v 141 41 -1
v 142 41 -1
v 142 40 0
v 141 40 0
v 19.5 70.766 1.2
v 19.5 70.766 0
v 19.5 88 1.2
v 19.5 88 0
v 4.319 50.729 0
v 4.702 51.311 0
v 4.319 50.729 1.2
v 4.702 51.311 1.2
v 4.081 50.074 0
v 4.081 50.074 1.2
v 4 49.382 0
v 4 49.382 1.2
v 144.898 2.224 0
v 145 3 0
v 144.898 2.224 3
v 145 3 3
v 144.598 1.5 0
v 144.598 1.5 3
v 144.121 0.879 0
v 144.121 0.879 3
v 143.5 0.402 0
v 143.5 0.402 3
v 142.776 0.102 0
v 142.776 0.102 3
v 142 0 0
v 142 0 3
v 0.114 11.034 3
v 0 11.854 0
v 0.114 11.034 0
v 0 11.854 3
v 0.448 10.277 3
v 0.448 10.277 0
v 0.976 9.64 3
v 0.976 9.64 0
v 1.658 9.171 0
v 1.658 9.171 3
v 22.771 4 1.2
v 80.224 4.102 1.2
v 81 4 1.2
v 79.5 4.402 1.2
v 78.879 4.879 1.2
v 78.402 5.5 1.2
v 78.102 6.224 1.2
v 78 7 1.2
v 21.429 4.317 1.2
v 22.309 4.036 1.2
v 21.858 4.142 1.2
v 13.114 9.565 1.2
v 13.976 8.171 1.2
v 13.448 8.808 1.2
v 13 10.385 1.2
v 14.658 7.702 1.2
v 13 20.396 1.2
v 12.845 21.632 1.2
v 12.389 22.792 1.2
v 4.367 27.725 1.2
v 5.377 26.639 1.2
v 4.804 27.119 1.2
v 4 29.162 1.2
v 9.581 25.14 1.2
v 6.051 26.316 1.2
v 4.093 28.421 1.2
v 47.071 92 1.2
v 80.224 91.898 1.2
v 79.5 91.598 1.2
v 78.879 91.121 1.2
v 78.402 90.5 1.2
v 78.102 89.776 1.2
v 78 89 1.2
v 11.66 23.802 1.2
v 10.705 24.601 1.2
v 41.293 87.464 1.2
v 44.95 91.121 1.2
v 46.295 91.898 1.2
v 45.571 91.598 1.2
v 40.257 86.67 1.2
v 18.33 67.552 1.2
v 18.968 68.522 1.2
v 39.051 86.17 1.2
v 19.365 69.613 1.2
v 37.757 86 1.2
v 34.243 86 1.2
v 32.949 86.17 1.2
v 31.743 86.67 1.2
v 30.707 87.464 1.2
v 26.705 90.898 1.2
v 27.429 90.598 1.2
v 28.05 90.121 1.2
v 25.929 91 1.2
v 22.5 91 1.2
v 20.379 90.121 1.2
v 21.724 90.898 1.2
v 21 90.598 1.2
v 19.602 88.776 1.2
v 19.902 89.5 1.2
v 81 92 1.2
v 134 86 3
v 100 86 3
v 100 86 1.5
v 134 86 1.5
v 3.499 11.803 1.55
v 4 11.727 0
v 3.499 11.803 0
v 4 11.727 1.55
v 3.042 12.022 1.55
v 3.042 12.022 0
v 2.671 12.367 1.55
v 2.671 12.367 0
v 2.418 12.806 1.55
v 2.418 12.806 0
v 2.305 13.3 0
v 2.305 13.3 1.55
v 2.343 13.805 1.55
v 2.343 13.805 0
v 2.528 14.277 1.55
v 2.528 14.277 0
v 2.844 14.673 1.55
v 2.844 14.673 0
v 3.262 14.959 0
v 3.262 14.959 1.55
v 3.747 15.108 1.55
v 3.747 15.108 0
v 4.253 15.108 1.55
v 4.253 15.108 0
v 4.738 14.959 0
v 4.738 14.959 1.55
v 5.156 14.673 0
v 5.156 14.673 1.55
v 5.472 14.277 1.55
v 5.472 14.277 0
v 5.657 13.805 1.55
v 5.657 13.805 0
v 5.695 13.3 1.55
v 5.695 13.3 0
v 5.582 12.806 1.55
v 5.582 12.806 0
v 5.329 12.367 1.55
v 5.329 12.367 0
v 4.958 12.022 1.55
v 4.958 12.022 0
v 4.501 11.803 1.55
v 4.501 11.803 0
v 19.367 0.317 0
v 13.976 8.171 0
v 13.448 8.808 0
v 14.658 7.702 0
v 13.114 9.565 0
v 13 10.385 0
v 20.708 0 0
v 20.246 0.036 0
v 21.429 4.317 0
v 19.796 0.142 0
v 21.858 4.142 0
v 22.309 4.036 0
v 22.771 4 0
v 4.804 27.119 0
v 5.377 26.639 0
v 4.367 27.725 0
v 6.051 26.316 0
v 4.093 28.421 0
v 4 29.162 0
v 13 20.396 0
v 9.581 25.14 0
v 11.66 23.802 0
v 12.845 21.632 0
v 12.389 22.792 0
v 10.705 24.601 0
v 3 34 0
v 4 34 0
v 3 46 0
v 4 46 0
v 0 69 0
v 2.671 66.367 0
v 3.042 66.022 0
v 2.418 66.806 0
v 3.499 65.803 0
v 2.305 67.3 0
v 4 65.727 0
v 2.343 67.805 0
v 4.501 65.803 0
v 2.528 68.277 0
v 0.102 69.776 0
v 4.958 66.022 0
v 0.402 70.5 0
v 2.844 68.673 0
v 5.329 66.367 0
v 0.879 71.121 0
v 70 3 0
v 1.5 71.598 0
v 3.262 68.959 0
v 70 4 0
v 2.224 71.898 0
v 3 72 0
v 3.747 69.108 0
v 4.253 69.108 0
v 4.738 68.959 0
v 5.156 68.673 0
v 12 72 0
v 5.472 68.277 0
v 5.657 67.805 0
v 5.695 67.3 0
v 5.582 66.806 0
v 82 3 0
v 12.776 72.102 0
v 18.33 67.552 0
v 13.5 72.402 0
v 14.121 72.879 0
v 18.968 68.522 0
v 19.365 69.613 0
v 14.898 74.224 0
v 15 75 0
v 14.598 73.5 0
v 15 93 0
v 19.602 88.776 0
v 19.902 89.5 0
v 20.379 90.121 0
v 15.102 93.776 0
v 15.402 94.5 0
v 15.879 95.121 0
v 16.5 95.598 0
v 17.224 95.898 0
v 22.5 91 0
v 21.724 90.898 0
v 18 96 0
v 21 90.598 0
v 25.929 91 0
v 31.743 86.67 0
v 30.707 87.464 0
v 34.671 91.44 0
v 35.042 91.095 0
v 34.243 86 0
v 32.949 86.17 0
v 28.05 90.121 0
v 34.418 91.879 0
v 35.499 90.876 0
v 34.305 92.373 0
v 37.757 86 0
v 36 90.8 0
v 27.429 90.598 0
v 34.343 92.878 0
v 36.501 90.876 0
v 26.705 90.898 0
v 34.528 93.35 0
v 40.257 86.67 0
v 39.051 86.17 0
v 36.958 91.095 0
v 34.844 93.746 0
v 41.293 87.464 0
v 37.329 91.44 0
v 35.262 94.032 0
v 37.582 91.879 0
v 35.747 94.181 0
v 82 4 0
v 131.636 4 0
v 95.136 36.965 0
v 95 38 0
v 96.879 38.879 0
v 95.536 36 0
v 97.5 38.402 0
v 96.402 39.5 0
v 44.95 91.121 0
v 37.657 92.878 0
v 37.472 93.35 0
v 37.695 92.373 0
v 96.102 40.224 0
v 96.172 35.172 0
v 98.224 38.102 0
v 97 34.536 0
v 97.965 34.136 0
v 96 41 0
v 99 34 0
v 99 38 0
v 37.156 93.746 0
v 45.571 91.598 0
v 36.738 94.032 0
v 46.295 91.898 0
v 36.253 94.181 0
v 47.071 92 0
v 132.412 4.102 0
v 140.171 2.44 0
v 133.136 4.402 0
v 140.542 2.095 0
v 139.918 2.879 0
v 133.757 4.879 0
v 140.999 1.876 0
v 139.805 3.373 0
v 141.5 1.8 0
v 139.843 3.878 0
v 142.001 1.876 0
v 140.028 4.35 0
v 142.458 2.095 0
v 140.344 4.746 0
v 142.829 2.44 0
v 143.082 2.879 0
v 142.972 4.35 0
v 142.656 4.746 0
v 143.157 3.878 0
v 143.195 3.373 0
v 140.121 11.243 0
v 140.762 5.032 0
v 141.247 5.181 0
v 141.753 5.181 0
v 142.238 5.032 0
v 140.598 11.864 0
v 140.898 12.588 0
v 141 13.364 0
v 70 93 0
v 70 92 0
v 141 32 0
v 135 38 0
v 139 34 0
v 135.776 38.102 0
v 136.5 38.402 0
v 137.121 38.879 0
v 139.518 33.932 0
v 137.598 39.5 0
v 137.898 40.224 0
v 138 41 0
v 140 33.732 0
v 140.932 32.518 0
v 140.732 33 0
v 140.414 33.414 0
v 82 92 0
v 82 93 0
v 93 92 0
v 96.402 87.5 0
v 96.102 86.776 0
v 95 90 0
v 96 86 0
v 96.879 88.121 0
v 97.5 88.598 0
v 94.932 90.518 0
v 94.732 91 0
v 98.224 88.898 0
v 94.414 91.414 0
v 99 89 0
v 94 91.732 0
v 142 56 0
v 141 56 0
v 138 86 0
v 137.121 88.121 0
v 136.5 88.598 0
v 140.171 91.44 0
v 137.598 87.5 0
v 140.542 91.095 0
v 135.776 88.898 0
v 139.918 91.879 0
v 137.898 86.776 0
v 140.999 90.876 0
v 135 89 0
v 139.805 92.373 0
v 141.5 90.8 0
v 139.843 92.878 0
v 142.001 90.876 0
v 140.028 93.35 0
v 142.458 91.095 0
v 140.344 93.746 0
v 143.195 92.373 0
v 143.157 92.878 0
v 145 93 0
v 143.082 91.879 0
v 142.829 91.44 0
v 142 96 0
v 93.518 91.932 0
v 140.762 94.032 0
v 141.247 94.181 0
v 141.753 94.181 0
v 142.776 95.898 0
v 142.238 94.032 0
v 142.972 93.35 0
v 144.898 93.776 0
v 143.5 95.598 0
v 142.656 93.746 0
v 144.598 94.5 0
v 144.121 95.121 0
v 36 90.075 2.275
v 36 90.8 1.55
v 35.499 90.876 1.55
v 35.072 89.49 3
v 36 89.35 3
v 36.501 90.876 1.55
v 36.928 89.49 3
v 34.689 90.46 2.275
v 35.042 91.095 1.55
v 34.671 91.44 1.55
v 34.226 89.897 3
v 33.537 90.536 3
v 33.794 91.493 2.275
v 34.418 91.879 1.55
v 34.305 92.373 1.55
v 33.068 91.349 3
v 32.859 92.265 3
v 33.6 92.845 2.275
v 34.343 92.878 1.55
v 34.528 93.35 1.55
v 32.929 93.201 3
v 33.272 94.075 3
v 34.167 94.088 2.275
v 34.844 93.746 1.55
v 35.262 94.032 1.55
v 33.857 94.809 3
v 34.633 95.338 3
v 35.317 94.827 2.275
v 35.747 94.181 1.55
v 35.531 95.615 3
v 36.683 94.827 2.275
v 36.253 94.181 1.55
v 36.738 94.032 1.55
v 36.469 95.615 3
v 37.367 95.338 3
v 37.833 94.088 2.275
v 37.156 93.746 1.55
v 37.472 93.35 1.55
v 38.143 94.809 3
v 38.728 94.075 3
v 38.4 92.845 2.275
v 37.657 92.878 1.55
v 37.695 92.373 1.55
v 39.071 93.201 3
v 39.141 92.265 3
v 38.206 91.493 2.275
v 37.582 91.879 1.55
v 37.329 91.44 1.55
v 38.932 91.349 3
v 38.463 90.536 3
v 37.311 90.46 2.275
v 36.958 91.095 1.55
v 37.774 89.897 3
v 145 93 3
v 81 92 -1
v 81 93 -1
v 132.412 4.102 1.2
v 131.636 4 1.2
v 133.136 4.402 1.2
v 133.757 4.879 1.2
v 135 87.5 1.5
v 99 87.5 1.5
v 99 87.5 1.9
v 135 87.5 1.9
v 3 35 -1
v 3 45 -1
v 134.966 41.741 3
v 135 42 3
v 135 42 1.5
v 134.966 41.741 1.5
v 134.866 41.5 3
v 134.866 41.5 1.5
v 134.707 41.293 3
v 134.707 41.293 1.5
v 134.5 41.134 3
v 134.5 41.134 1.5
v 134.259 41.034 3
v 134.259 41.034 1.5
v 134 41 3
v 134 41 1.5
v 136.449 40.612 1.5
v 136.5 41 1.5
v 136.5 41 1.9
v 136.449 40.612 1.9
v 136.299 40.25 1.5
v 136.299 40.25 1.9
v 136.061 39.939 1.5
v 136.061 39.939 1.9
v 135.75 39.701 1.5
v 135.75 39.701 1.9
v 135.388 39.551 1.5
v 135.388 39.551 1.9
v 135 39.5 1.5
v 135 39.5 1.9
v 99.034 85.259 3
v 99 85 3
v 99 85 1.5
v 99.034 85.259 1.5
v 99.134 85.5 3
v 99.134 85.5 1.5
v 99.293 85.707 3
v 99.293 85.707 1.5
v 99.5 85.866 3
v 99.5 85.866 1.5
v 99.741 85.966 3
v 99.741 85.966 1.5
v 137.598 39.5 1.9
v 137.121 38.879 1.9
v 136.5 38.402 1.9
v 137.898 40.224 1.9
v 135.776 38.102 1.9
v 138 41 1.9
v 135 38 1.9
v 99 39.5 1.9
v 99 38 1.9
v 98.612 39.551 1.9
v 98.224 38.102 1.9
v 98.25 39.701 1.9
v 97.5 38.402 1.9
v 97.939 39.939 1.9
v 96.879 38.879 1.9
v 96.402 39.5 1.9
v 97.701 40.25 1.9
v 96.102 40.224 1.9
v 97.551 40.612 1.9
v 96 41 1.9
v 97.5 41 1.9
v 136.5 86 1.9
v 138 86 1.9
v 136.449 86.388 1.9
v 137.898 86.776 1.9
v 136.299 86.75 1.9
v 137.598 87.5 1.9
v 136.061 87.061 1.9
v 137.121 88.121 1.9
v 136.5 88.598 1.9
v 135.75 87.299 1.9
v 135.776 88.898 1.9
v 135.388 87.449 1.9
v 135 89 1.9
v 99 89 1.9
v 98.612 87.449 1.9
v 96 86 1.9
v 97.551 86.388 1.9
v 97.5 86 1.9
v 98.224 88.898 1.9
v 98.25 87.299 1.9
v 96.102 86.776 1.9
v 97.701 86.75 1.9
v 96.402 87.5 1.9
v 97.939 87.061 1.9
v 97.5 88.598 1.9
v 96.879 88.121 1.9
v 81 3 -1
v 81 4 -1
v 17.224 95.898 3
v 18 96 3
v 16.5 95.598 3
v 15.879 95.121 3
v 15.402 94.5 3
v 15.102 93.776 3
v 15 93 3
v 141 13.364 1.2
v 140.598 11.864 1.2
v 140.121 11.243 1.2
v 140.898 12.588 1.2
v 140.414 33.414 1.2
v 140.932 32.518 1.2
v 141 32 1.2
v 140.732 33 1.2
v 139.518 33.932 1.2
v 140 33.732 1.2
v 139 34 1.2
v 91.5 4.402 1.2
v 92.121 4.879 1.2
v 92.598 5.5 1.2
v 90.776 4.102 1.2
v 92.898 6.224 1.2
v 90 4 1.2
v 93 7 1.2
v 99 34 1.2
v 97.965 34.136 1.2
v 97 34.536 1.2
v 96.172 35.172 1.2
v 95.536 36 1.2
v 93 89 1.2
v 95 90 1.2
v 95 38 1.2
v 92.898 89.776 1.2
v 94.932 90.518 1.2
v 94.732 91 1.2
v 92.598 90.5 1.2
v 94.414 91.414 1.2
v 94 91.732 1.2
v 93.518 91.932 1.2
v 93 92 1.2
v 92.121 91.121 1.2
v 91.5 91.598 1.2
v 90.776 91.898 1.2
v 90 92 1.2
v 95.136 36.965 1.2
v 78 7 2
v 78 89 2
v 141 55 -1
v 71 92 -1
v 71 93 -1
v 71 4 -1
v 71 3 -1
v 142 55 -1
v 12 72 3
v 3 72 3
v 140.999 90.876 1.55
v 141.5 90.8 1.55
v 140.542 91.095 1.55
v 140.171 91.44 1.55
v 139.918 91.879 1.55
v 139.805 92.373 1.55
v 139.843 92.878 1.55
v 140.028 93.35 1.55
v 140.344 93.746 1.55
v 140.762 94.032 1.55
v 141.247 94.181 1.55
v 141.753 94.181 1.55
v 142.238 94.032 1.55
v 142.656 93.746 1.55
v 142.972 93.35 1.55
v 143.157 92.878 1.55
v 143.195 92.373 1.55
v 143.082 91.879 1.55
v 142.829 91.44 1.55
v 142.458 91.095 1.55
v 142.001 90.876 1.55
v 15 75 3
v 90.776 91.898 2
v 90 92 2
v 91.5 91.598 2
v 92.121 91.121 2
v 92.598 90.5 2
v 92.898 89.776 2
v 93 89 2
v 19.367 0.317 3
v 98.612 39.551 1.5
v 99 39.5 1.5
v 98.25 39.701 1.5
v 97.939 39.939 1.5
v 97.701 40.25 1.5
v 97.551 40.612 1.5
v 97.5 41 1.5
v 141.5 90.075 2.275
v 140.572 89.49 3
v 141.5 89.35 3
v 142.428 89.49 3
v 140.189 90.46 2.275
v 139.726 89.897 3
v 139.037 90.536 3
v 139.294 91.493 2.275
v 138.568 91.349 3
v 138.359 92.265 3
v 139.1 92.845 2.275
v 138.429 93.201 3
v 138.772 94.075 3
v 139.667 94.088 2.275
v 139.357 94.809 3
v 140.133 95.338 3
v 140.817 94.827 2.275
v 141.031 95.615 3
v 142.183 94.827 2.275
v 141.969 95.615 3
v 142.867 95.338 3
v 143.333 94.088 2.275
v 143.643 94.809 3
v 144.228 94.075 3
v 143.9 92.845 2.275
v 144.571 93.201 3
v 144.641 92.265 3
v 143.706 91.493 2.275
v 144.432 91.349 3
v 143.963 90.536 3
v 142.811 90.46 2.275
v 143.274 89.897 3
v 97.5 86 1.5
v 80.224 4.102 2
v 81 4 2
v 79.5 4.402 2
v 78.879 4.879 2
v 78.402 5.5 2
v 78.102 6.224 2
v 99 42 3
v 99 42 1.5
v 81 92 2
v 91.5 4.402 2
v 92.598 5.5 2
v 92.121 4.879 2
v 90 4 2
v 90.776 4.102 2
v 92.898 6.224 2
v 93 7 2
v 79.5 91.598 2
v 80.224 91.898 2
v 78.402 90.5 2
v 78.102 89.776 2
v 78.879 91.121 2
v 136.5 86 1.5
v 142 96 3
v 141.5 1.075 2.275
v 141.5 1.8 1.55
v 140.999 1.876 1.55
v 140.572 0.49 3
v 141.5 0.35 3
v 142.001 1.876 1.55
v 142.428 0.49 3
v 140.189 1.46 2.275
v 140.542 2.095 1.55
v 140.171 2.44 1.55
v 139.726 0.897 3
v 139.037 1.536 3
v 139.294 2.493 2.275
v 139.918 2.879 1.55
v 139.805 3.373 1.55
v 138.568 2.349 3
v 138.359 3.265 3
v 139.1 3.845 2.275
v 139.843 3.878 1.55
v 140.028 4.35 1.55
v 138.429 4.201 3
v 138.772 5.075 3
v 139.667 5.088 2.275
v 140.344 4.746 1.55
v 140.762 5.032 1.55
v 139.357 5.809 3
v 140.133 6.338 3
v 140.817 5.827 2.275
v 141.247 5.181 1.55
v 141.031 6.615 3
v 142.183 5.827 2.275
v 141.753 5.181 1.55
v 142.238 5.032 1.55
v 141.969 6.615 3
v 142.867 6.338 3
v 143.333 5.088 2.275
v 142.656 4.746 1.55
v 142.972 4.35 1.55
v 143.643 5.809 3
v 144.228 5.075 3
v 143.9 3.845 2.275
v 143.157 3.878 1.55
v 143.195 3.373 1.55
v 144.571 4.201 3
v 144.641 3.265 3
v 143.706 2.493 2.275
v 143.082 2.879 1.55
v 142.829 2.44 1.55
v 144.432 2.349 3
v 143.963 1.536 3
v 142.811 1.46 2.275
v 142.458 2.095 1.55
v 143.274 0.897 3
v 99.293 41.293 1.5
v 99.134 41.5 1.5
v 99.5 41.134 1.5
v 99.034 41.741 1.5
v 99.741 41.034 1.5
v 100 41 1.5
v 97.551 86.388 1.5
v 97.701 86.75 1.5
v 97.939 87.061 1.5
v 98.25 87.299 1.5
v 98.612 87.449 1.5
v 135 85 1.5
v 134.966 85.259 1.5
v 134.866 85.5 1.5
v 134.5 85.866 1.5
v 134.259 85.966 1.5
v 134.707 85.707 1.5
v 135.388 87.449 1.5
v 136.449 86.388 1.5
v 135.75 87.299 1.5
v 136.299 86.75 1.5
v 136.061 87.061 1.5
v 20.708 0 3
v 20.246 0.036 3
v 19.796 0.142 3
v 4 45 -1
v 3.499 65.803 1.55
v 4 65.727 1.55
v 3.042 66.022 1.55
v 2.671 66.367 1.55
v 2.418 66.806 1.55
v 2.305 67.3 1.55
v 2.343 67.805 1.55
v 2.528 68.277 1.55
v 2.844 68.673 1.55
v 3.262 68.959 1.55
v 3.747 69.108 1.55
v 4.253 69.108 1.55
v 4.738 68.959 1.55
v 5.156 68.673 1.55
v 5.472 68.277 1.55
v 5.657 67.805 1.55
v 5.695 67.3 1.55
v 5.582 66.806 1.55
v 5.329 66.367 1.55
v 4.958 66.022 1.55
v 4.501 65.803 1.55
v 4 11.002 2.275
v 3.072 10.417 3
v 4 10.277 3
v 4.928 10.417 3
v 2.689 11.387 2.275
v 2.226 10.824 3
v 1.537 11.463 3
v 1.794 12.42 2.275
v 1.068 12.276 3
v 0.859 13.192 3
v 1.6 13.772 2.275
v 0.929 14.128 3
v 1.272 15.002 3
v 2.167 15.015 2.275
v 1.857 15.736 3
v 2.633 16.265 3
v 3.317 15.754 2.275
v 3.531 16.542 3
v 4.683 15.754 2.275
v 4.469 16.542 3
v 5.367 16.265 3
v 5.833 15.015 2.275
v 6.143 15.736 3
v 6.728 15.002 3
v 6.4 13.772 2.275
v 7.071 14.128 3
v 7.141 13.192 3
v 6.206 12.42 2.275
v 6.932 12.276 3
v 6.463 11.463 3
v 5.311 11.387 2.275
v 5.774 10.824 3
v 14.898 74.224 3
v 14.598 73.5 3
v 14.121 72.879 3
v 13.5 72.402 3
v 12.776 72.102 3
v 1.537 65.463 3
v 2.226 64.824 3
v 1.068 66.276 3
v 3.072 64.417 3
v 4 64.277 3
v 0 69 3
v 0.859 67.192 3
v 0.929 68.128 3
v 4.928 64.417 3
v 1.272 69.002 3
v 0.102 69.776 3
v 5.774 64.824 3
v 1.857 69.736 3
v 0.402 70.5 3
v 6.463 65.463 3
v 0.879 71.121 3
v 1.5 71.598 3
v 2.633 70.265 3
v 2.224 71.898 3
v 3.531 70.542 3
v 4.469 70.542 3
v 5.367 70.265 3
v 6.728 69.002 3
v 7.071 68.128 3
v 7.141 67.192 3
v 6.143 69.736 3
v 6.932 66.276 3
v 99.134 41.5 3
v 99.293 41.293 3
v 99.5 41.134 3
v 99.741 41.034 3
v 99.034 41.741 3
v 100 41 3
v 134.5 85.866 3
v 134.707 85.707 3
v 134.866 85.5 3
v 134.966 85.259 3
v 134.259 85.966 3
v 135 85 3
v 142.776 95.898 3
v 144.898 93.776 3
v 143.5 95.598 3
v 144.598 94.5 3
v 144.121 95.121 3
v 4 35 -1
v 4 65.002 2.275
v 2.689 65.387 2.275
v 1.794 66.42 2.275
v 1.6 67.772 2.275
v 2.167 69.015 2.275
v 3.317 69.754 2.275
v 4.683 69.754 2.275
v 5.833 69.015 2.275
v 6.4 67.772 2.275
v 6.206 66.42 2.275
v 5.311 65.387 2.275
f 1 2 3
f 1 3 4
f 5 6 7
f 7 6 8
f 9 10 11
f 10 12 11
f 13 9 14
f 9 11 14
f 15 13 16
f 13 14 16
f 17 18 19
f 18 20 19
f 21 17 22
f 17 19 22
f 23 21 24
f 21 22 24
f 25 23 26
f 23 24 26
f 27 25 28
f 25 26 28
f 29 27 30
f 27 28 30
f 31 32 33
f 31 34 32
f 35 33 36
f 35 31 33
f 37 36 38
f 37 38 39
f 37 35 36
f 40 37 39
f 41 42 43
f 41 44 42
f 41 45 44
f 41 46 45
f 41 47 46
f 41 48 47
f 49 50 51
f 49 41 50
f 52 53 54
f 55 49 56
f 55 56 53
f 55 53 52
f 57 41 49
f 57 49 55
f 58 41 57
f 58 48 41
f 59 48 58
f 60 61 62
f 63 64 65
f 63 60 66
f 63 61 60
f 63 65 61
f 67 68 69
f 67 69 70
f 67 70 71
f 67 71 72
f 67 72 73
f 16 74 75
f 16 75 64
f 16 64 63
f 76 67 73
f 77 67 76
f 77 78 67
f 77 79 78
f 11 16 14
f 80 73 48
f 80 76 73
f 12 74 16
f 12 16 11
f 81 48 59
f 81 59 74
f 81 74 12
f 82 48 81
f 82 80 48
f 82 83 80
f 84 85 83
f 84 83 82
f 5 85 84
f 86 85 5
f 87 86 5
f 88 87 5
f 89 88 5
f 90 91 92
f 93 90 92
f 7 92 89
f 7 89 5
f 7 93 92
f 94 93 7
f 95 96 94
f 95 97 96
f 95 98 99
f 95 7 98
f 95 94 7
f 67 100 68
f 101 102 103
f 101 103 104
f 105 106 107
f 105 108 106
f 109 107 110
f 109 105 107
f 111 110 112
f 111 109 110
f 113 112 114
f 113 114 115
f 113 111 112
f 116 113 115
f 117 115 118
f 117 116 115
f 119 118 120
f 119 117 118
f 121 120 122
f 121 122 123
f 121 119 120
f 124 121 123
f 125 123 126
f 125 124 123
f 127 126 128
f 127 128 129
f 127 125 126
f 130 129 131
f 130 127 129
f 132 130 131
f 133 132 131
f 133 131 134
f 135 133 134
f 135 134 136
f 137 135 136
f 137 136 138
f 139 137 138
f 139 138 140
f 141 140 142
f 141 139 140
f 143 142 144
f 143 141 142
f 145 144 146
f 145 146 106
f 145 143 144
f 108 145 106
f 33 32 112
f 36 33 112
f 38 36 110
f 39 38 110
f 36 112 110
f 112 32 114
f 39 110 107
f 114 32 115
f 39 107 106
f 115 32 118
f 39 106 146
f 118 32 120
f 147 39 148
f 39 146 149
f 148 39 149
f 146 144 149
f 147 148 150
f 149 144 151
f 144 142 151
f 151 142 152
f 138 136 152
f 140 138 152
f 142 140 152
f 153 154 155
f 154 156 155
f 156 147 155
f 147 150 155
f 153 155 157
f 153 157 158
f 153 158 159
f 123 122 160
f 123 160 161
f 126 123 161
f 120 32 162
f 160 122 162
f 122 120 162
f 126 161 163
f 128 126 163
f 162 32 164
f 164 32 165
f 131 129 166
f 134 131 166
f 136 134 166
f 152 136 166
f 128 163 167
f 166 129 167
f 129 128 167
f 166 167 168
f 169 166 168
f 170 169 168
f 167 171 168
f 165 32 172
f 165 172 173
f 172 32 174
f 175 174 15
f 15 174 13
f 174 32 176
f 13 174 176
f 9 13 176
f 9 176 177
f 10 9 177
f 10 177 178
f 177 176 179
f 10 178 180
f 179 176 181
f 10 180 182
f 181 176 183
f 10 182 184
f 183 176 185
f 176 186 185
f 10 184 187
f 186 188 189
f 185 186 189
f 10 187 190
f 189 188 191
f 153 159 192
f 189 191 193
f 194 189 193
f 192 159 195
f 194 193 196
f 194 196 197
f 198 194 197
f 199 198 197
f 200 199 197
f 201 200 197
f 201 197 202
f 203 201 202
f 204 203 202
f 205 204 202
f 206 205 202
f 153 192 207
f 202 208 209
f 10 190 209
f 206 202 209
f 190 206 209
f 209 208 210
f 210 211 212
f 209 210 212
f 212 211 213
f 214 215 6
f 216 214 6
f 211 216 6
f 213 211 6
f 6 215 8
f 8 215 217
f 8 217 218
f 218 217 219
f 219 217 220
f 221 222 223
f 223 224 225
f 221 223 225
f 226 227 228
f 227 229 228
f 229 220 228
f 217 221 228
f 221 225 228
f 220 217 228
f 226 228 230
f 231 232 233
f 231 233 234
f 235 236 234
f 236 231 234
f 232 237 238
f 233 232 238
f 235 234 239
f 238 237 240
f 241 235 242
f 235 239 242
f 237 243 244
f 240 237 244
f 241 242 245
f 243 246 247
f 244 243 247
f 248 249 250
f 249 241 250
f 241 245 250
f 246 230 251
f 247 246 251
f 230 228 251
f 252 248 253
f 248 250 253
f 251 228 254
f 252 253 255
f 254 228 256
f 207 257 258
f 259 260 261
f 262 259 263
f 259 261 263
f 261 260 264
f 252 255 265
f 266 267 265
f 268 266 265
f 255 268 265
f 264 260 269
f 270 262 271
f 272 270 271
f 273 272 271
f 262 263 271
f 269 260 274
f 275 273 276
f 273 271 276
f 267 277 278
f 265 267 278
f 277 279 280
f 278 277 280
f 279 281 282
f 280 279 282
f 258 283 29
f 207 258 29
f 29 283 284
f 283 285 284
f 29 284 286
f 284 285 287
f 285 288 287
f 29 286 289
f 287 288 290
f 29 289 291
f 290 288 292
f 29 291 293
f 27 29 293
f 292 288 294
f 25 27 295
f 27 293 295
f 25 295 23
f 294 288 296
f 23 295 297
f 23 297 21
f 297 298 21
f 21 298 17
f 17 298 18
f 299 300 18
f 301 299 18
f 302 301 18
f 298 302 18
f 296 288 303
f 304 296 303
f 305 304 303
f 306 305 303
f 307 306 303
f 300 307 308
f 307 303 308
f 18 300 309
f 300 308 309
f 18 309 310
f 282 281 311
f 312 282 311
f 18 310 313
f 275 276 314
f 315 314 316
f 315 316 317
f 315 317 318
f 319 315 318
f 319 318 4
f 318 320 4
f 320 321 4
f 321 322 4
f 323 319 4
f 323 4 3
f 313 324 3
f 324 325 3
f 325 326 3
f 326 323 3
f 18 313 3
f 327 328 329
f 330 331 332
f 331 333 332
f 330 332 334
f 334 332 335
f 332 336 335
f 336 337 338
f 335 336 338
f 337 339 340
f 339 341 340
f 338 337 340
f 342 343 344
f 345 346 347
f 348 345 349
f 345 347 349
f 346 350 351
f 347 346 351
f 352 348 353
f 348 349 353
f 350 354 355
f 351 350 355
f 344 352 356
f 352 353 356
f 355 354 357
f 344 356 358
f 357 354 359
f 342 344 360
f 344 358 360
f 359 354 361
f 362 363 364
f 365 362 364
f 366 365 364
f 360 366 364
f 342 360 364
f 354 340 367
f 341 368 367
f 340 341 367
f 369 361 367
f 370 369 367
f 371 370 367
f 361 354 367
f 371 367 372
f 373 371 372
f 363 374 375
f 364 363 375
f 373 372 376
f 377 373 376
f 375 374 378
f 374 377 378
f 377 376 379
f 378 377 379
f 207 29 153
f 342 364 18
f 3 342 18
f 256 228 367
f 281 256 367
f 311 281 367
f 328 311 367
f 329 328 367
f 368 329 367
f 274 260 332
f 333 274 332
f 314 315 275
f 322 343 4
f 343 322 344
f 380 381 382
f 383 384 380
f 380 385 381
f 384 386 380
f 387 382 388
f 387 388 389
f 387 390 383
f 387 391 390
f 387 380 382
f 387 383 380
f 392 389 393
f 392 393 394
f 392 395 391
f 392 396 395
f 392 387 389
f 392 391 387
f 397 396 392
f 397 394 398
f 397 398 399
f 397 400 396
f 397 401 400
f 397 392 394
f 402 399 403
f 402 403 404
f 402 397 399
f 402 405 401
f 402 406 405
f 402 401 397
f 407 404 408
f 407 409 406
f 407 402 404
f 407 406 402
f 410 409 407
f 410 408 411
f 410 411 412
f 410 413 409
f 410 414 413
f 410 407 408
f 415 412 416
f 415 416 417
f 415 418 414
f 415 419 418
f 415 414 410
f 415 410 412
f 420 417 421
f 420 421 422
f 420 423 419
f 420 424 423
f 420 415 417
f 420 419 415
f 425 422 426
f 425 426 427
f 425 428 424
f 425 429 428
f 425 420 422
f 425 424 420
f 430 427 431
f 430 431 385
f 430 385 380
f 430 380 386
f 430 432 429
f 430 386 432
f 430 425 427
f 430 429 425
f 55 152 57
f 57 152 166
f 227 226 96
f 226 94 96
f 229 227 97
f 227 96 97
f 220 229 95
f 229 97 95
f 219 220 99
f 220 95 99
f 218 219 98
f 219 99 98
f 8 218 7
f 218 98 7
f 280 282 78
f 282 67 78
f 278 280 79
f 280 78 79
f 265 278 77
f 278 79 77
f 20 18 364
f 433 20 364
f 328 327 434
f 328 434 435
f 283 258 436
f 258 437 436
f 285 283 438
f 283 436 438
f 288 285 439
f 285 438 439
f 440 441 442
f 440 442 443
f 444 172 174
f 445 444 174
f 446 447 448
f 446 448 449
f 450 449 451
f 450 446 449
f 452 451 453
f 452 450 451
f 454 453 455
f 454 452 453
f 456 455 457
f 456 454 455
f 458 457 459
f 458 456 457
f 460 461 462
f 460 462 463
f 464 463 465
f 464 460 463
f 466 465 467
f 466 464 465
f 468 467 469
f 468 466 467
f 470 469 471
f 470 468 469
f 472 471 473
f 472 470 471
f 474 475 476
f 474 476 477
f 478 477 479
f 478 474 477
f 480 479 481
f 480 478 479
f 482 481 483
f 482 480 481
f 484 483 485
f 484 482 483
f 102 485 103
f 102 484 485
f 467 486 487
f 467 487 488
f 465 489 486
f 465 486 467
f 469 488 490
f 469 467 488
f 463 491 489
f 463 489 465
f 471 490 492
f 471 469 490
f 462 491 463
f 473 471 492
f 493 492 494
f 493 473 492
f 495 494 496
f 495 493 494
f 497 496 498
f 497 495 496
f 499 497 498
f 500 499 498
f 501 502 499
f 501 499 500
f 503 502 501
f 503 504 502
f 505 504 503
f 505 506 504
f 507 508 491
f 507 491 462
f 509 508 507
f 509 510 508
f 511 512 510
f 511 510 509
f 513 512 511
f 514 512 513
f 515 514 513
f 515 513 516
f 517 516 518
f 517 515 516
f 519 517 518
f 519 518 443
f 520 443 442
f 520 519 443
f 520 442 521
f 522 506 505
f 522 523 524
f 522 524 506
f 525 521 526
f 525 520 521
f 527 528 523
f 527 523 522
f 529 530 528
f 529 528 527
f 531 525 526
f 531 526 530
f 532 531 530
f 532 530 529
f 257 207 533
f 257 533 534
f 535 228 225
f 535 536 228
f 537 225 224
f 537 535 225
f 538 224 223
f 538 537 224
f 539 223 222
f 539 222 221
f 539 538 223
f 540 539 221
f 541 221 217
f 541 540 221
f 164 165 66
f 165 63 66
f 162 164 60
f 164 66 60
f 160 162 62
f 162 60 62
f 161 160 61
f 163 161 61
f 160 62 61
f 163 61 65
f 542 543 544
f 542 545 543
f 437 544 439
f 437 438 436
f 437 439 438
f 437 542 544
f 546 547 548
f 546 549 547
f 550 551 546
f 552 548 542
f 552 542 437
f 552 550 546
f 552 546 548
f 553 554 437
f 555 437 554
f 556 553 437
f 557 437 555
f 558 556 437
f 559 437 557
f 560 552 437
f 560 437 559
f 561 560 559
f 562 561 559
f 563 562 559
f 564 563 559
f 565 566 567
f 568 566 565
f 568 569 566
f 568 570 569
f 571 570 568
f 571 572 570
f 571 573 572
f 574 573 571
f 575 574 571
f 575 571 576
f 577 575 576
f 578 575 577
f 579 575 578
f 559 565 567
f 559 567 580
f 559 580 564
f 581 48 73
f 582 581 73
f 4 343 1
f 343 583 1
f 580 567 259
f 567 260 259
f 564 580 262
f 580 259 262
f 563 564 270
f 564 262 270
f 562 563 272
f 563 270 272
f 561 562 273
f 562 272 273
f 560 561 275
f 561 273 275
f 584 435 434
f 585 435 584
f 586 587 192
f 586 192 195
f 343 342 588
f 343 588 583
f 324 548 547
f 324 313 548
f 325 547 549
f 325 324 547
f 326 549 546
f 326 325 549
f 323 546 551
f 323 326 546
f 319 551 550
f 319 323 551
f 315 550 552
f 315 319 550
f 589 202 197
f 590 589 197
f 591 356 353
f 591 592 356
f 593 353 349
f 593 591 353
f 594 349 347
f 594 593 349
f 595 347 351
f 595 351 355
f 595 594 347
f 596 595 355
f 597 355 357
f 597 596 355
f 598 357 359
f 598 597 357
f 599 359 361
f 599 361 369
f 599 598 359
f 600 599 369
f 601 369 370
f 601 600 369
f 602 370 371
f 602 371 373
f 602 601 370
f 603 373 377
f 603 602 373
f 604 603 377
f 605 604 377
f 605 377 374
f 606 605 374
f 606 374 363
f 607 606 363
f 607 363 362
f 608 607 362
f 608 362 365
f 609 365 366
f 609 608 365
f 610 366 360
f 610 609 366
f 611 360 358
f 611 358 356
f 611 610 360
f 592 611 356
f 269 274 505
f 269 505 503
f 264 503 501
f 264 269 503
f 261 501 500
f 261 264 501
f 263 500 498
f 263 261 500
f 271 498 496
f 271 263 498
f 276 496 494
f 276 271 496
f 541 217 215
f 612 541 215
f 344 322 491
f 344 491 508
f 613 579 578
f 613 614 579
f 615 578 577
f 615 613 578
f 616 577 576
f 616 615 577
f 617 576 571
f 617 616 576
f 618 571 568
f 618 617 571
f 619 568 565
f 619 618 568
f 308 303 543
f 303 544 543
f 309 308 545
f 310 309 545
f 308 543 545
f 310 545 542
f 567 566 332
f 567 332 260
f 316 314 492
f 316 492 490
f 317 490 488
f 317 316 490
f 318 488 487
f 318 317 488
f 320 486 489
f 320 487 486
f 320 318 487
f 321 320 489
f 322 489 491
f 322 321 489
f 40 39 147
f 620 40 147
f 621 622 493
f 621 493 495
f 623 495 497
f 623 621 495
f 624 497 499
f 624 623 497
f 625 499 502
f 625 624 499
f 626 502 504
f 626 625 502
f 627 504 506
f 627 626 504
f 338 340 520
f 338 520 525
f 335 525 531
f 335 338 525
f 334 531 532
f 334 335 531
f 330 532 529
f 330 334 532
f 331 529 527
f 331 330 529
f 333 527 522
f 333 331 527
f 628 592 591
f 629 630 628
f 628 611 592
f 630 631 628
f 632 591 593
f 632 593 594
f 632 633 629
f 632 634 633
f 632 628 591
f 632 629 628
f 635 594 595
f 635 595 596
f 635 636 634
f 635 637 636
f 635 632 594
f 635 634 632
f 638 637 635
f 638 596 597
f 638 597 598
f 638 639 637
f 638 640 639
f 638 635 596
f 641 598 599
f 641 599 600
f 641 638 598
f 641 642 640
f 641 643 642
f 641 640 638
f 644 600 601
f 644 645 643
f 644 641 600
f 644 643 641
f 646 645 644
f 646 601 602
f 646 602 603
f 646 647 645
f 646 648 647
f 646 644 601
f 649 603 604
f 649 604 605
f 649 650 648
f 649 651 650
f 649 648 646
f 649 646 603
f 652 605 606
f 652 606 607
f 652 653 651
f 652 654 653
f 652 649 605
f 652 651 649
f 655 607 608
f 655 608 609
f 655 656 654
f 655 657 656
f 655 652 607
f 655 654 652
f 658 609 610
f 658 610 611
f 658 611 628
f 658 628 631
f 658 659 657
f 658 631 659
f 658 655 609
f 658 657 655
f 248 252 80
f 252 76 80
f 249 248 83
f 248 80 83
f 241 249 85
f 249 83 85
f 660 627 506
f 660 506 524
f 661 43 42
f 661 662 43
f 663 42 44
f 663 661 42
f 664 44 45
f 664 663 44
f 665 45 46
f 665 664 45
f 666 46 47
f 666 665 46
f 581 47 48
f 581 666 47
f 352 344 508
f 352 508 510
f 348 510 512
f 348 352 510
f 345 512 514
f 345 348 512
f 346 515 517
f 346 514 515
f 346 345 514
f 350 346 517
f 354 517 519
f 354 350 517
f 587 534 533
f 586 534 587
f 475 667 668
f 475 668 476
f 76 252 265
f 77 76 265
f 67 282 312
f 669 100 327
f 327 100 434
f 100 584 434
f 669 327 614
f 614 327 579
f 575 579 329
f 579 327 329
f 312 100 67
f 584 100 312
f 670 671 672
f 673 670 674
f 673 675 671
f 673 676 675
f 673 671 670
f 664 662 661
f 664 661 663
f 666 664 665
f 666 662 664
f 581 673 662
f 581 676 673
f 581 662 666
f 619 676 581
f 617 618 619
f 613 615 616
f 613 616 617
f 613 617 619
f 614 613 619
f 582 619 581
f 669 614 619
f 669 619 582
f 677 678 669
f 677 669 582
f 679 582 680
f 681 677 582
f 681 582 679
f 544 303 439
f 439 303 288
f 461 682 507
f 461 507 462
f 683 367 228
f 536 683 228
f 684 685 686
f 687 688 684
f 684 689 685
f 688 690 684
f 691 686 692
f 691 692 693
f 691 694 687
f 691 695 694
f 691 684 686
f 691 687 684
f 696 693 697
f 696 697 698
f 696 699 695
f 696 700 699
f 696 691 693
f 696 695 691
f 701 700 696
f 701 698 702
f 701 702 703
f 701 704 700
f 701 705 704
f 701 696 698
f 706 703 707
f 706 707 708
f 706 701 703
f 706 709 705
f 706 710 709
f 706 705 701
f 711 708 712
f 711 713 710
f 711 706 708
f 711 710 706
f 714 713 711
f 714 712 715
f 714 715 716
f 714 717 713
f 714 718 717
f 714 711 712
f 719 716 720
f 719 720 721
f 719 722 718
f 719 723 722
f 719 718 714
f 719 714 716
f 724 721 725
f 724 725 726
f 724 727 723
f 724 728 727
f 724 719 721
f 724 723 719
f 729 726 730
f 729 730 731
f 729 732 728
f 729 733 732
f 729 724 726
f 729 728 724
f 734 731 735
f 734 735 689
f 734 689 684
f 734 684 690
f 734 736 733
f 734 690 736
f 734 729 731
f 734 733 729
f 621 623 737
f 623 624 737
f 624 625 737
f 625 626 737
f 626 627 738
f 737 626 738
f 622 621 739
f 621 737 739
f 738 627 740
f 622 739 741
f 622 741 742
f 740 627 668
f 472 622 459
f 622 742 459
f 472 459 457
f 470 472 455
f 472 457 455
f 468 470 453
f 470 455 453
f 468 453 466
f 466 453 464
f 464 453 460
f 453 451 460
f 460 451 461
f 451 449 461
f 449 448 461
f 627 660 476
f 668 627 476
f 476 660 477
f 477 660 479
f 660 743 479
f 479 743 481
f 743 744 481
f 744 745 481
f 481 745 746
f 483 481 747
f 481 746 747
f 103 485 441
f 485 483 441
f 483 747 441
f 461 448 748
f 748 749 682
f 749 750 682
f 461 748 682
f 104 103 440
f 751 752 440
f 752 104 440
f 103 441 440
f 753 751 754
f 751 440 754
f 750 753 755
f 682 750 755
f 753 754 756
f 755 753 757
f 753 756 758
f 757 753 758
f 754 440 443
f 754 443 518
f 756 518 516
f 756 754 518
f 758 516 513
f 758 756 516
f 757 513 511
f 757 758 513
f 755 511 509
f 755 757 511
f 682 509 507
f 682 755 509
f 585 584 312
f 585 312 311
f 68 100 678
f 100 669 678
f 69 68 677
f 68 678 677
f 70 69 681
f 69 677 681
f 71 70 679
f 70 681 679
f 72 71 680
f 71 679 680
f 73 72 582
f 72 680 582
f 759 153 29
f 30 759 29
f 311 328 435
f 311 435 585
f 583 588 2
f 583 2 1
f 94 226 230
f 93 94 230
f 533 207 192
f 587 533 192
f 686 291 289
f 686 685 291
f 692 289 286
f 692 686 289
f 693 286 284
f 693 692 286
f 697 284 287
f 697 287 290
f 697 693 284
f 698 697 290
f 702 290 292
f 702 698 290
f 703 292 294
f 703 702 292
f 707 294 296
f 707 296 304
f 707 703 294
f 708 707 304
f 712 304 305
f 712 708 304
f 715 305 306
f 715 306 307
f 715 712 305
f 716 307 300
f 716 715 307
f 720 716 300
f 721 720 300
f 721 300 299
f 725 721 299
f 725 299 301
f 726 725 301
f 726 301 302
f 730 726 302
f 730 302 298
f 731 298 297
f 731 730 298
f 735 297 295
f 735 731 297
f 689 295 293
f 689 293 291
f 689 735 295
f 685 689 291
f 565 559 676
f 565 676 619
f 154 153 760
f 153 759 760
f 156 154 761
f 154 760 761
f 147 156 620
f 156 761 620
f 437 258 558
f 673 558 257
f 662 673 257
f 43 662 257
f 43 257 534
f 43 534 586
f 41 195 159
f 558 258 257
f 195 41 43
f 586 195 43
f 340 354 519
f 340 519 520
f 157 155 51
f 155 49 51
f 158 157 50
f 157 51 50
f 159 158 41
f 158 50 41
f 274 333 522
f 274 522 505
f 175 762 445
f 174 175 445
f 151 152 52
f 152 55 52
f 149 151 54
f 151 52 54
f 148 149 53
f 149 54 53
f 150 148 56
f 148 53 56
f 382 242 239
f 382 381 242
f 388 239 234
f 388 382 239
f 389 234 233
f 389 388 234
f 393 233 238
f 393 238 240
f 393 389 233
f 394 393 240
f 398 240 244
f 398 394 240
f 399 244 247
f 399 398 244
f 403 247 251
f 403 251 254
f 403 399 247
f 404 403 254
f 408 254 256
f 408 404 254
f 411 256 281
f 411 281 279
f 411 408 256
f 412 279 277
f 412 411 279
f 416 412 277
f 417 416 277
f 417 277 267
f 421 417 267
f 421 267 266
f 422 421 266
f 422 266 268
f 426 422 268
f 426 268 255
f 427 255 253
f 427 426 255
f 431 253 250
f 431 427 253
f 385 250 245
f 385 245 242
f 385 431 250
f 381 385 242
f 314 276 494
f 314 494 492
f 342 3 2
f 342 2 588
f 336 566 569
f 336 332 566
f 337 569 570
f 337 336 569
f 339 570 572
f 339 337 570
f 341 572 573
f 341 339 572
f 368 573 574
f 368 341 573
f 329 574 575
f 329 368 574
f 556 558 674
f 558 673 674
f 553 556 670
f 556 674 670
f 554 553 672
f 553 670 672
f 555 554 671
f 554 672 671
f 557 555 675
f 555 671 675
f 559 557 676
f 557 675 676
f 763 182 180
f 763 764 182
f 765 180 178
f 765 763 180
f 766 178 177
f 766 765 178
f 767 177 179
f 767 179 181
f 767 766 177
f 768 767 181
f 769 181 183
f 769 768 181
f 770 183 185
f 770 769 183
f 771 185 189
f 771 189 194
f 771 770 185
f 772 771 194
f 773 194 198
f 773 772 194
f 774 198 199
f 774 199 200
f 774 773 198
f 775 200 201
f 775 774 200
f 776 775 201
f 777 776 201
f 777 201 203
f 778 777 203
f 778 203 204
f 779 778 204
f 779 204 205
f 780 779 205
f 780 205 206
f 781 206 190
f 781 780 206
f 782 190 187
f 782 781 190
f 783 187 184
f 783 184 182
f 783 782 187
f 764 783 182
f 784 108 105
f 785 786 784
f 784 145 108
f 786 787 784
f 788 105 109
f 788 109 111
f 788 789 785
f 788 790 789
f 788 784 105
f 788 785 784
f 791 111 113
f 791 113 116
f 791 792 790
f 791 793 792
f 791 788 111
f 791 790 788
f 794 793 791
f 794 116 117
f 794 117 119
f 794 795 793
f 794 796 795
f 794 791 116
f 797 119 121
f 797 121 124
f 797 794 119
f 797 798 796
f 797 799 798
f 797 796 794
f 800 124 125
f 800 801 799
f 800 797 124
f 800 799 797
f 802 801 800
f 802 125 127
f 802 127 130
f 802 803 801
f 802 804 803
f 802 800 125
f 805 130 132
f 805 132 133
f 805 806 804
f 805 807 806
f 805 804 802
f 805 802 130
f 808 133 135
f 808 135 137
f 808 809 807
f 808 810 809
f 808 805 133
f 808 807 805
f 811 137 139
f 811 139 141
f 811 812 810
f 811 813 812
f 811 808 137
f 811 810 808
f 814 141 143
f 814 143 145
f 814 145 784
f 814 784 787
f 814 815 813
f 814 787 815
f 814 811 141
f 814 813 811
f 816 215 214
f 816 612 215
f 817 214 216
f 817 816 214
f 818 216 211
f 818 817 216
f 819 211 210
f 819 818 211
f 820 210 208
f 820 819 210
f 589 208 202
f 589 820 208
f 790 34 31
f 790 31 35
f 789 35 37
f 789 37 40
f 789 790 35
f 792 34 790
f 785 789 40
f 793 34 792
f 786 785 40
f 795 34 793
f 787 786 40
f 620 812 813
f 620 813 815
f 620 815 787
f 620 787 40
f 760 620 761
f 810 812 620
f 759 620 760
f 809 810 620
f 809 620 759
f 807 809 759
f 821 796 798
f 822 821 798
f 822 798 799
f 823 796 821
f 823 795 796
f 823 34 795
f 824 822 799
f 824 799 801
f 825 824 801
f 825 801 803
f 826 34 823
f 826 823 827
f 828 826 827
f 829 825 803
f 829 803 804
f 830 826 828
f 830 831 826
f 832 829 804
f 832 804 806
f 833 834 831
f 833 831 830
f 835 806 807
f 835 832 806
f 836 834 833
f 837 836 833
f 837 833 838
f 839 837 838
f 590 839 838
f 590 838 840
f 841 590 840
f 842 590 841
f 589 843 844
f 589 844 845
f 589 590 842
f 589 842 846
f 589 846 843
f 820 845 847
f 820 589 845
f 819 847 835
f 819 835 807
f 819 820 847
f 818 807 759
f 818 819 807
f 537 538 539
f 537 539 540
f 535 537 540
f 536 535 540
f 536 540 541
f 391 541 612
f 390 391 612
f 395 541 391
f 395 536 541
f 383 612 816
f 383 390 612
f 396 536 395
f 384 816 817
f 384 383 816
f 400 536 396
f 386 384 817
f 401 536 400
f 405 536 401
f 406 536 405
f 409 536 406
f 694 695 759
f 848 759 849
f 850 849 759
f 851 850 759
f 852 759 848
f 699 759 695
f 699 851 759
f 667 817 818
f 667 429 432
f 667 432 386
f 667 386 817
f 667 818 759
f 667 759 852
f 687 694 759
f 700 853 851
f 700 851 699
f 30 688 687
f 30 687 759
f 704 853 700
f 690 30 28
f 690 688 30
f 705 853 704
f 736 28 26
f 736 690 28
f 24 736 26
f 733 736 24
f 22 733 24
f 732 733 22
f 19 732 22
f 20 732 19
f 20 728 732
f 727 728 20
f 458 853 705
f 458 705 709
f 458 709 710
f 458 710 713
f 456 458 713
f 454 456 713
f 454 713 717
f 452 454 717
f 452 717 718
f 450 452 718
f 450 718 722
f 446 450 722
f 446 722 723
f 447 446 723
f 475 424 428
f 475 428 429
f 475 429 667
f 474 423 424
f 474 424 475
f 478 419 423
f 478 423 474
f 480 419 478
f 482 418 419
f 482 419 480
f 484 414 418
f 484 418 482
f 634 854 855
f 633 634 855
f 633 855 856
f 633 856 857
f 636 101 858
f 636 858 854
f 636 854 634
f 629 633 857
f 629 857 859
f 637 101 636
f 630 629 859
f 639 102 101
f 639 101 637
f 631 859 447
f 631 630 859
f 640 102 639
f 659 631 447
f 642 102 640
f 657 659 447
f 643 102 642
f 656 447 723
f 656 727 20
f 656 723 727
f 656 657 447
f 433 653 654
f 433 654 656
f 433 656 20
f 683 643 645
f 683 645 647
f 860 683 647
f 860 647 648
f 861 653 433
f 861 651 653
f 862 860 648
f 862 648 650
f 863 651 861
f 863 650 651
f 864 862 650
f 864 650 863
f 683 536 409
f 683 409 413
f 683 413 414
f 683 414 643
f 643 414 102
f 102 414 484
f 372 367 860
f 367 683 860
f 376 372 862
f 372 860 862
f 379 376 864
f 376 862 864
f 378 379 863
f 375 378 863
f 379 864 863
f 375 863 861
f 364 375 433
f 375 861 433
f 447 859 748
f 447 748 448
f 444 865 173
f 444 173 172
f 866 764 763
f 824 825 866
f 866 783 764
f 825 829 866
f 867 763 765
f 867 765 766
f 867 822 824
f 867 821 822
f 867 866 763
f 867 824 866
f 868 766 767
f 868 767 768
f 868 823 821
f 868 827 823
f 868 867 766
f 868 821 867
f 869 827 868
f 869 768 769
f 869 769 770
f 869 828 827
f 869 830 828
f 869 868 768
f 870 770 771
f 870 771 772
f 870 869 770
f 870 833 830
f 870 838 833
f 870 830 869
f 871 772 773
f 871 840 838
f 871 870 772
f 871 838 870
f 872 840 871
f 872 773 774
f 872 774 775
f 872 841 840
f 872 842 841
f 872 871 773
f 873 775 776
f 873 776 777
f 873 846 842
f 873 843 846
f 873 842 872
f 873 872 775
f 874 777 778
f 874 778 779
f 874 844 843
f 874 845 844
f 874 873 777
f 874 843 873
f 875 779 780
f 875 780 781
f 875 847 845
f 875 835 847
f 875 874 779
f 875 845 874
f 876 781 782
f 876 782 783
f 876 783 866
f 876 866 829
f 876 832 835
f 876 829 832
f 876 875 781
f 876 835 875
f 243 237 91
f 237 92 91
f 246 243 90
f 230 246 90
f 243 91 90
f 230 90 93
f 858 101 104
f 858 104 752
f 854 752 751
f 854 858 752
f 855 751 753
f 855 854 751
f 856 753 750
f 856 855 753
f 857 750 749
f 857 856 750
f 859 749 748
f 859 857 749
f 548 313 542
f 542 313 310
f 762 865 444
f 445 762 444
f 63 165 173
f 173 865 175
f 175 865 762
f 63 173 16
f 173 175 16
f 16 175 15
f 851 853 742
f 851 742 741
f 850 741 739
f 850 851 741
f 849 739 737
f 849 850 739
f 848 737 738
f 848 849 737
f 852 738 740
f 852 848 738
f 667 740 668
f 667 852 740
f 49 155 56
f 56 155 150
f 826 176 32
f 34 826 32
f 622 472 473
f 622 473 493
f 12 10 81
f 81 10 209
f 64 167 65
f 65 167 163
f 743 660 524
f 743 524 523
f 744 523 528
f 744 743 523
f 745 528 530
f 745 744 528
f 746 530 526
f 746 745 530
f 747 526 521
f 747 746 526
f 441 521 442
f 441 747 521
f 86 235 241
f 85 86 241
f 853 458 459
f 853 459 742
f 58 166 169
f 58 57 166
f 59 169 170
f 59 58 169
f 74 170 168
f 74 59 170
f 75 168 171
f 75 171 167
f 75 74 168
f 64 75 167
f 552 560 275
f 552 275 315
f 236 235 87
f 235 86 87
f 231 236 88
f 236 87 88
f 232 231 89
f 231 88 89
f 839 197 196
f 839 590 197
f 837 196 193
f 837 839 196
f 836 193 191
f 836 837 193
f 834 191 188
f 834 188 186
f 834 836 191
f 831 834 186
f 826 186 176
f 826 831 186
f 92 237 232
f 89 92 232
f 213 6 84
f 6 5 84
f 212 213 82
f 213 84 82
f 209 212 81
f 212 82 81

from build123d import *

# Parameters (mm, degrees)
EXTRUDE_1_DEPTH             = 3
HOLE_WIZARD_M3_1_AT_2_COUNT = 2
HOLE_WIZARD_M3_1_AT_2_PITCH = 89
HOLE_WIZARD_M3_1_AT_3_COUNT = 2
HOLE_WIZARD_M3_1_AT_3_PITCH = 139.767316539
HOLE_WIZARD_M3_1_AT_4_COUNT = 2
HOLE_WIZARD_M3_1_AT_4_PITCH = 158.615198724
HOLE_WIZARD_M3_1_AT_5_COUNT = 2
HOLE_WIZARD_M3_1_AT_5_PITCH = 105.5
FILLET_1_R                  = 3
FILLET_2_R                  = 3
CUT_EXTRUDE_1_DEPTH         = 1.2
SKETCH_5_W                  = 15
SKETCH_5_H                  = 88
CUT_EXTRUDE_2_DEPTH         = 0.8
FILLET_5_R                  = 3
FILLET_6_R                  = 5
FILLET_7_R                  = 3
SKETCH_6_W                  = 1
SKETCH_6_H                  = 16
SKETCH_6_H_2                = 12
SKETCH_6_W_2                = 12
SKETCH_6_H_3                = 1
EXTRUDE_2_DEPTH             = 1
FILLET_8_R                  = 3
CHAMFER_1_SIZE              = 1
EXTRUDE_4_DEPTH             = 1.2
CUT_EXTRUDE_3_DEPTH         = 10
CUT_EXTRUDE_5_DEPTH         = 1.5
CUT_EXTRUDE_6_DEPTH         = 0.4
FILLET_9_R                  = 2
FILLET_10_R                 = 4


with BuildPart() as part:
    # 草图1 → 凸台-拉伸1 (new body)
    with BuildSketch(Plane.XY):
        Polygon((15, 96), (15, 72), (0, 72), (0, 10), (20, 0), (145, 0), (145, 96), align=None)
    extrude(amount=EXTRUDE_1_DEPTH)

    # 草图2 → M3 平头机械螺钉的锥形沉头孔1 (revolve, cut)
    with BuildSketch(Plane(origin=(141.5, 92.5, 3), x_dir=(0, -1, 0), z_dir=(1, 0, 0))):
        Polygon((0, 0), (0, 3), (1.7, 3), (1.7, 1.45), (3.15, 0), align=None)
    hole_wizard_m3_1 = revolve(axis=Axis((141.5, 92.5, 9.35), (0, 0, -1)), mode=Mode.SUBTRACT)

    # M3 平头机械螺钉的锥形沉头孔1 at 2: M3 平头机械螺钉的锥形沉头孔1 ×2
    with Locations(*[(0, -i * HOLE_WIZARD_M3_1_AT_2_PITCH, 0) for i in range(1, HOLE_WIZARD_M3_1_AT_2_COUNT)]):
        add(hole_wizard_m3_1, mode=Mode.SUBTRACT)

    # M3 平头机械螺钉的锥形沉头孔1 at 3: M3 平头机械螺钉的锥形沉头孔1 ×2
    with Locations(*[Vector(-0.9837779203696774, -0.1793906446644101, 0) * (i * HOLE_WIZARD_M3_1_AT_3_PITCH) for i in range(1, HOLE_WIZARD_M3_1_AT_3_COUNT)]):
        add(hole_wizard_m3_1, mode=Mode.SUBTRACT)

    # M3 平头机械螺钉的锥形沉头孔1 at 4: M3 平头机械螺钉的锥形沉头孔1 ×2
    with Locations(*[Vector(-0.8668778345720617, -0.4985206313961874, 0) * (i * HOLE_WIZARD_M3_1_AT_4_PITCH) for i in range(1, HOLE_WIZARD_M3_1_AT_4_COUNT)]):
        add(hole_wizard_m3_1, mode=Mode.SUBTRACT)

    # M3 平头机械螺钉的锥形沉头孔1 at 5: M3 平头机械螺钉的锥形沉头孔1 ×2
    with Locations(*[(-i * HOLE_WIZARD_M3_1_AT_5_PITCH, 0, 0) for i in range(1, HOLE_WIZARD_M3_1_AT_5_COUNT)]):
        add(hole_wizard_m3_1, mode=Mode.SUBTRACT)

    # 圆角1
    fillet_1_edges = [part.edges().sort_by_distance(p)[0] for p in [
        (145, 0, 1.5),
        (145, 96, 1.5),
    ]]
    fillet(fillet_1_edges, radius=FILLET_1_R)

    # 圆角2
    fillet_2_edges = [part.edges().sort_by_distance(p)[0] for p in [
        (20, 0, 1.5),
        (0, 10, 1.5),
        (0, 72, 1.5),
        (15, 96, 1.5),
    ]]
    fillet(fillet_2_edges, radius=FILLET_2_R)

    # 草图4 → 切除-拉伸1 (cut)
    with BuildSketch(Plane(origin=(0, 0, 0), x_dir=(-1, 0, 0), z_dir=(0, 0, -1))):
        Polygon((-133.585786438, 92), (-141, 84.585786438), (-141, 12.121320344), (-132.878679656, 4), (-22.062305899, 4), (-13, 8.531152949), (-13, 24), (-4, 27), (-4, 50.47410222), (-19.5, 68.946282906), (-19.5, 91), (-27.171572875, 91), (-32.171572875, 86), (-39.828427125, 86), (-45.828427125, 92), align=None)
    extrude(amount=-CUT_EXTRUDE_1_DEPTH, mode=Mode.SUBTRACT)

    # 草图5 → 切除-拉伸2 (cut)
    with BuildSketch(Plane(origin=(0, 0, 1.2), x_dir=(-1, 0, 0), z_dir=(0, 0, -1))):
        with Locations((-85.5, 48)):
            Rectangle(SKETCH_5_W, SKETCH_5_H)
    extrude(amount=-CUT_EXTRUDE_2_DEPTH, mode=Mode.SUBTRACT)

    # 圆角5
    fillet_5_edges = [part.edges().sort_by_distance(p)[0] for p in [
        (13, 8.531152949, 0.6),
        (22.062305899, 4, 0.6),
        (132.878679656, 4, 0.6),
        (141, 12.121320344, 0.6),
        (141, 84.585786438, 0.6),
        (133.585786438, 92, 0.6),
        (4, 50.47410222, 0.6),
        (4, 27, 0.6),
        (45.828427125, 92, 0.6),
        (27.171572875, 91, 0.6),
        (19.5, 91, 0.6),
    ]]
    fillet(fillet_5_edges, radius=FILLET_5_R)

    # 圆角6
    fillet_6_edges = [part.edges().sort_by_distance(p)[0] for p in [
        (39.828427125, 86, 0.6),
        (32.171572875, 86, 0.6),
        (19.5, 68.946282906, 0.6),
        (13, 24, 0.6),
    ]]
    fillet(fillet_6_edges, radius=FILLET_6_R)

    # 圆角7
    fillet_7_edges = [part.edges().sort_by_distance(p)[0] for p in [
        (78, 4, 1.6),
        (93, 4, 1.6),
        (78, 92, 1.6),
        (93, 92, 1.6),
    ]]
    fillet(fillet_7_edges, radius=FILLET_7_R)

    # 草图6 → 凸台-拉伸2 (add)
    with BuildSketch(Plane(origin=(0, 0, 0), x_dir=(-1, 0, 0), z_dir=(0, 0, -1))):
        with Locations((-141.5, 48)):
            Rectangle(SKETCH_6_W, SKETCH_6_H)
        with Locations((-3.5, 40)):
            Rectangle(SKETCH_6_W, SKETCH_6_H_2)
        with Locations((-76, 3.5)):
            Rectangle(SKETCH_6_W_2, SKETCH_6_H_3)
        with Locations((-76, 92.5)):
            Rectangle(SKETCH_6_W_2, SKETCH_6_H_3)
    extrude(amount=EXTRUDE_2_DEPTH)

    # 圆角8
    fillet_8_edges = [part.edges().sort_by_distance(p)[0] for p in [
        (15, 72, 1.5),
    ]]
    fillet(fillet_8_edges, radius=FILLET_8_R)

    # 倒角1
    chamfer_1_edges = [part.edges().sort_by_distance(p)[0] for p in [
        (3.5, 46, -1),
        (3.5, 34, -1),
        (70, 3.5, -1),
        (82, 3.5, -1),
        (141.5, 56, -1),
        (141.5, 40, -1),
        (82, 92.5, -1),
        (70, 92.5, -1),
    ]]
    chamfer(chamfer_1_edges, length=CHAMFER_1_SIZE - 0.0001)  # a hair under: the kernel refuses the full size

    # 草图9 → 凸台-拉伸4 (add)
    with BuildSketch(Plane(origin=(0, 0, 1.2), x_dir=(-1, 0, 0), z_dir=(0, 0, -1))):
        with BuildLine():
            Line((-95, 92), (-95, 34))
            Line((-95, 34), (-141, 34))
            Line((-141, 34), (-141, 83.343145751))
            ThreePointArc((-141, 83.343145751), (-140.771638598, 84.491196048), (-140.121320344, 85.464466094))
            Line((-140.121320344, 85.464466094), (-134.464466094, 91.121320344))
            ThreePointArc((-134.464466094, 91.121320344), (-133.491196048, 91.771638598), (-132.343145751, 92))
            Line((-132.343145751, 92), (-95, 92))
        make_face()
    extrude(amount=EXTRUDE_4_DEPTH)

    # 草图7 → 切除-拉伸3 (cut)
    with BuildSketch(Plane.XY.offset(3)):
        with BuildLine():
            Line((100, 86), (134, 86))
            ThreePointArc((134, 86), (134.707106781, 85.707106781), (135, 85))
            Line((135, 85), (135, 42))
            ThreePointArc((135, 42), (134.707106781, 41.292893219), (134, 41))
            Line((134, 41), (100, 41))
            ThreePointArc((100, 41), (99.292893219, 41.292893219), (99, 42))
            Line((99, 42), (99, 85))
            ThreePointArc((99, 85), (99.292893219, 85.707106781), (100, 86))
        make_face()
    extrude(amount=-CUT_EXTRUDE_3_DEPTH, mode=Mode.SUBTRACT)

    # 草图10 → 切除-拉伸5 (cut)
    with BuildSketch(Plane(origin=(0, 0, 0), x_dir=(-1, 0, 0), z_dir=(0, 0, -1))):
        with BuildLine():
            Line((-135, 89), (-99, 89))
            ThreePointArc((-99, 89), (-96.878679656, 88.121320344), (-96, 86))
            Line((-96, 86), (-96, 41))
            ThreePointArc((-96, 41), (-96.878679656, 38.878679656), (-99, 38))
            Line((-99, 38), (-135, 38))
            ThreePointArc((-135, 38), (-137.121320344, 38.878679656), (-138, 41))
            Line((-138, 41), (-138, 86))
            ThreePointArc((-138, 86), (-137.121320344, 88.121320344), (-135, 89))
        make_face()
    extrude(amount=-CUT_EXTRUDE_5_DEPTH, mode=Mode.SUBTRACT)

    # 草图12 → 切除-拉伸6 (cut)
    with BuildSketch(Plane(origin=(0, 0, 1.5), x_dir=(-1, 0, 0), z_dir=(0, 0, -1))):
        with BuildLine():
            Line((-135, 38), (-99, 38))
            ThreePointArc((-99, 38), (-96.878679656, 38.878679656), (-96, 41))
            Line((-96, 41), (-96, 86))
            ThreePointArc((-96, 86), (-96.878679656, 88.121320344), (-99, 89))
            Line((-99, 89), (-135, 89))
            ThreePointArc((-135, 89), (-137.121320344, 88.121320344), (-138, 86))
            Line((-138, 86), (-138, 41))
            ThreePointArc((-138, 41), (-137.121320344, 38.878679656), (-135, 38))
        make_face()
        with BuildLine():
            Line((-135, 39.5), (-99, 39.5))
            ThreePointArc((-99, 39.5), (-97.939339828, 39.939339828), (-97.5, 41))
            Line((-97.5, 41), (-97.5, 86))
            ThreePointArc((-97.5, 86), (-97.939339828, 87.060660172), (-99, 87.5))
            Line((-99, 87.5), (-135, 87.5))
            ThreePointArc((-135, 87.5), (-136.060660172, 87.060660172), (-136.5, 86))
            Line((-136.5, 86), (-136.5, 41))
            ThreePointArc((-136.5, 41), (-136.060660172, 39.939339828), (-135, 39.5))
        make_face(mode=Mode.SUBTRACT)
    extrude(amount=-CUT_EXTRUDE_6_DEPTH, mode=Mode.SUBTRACT)

    # 圆角9
    fillet_9_edges = [part.edges().sort_by_distance(p)[0] for p in [
        (141, 34, 0.6),
        (95, 92, 0.6),
    ]]
    fillet(fillet_9_edges, radius=FILLET_9_R)

    # 圆角10
    fillet_10_edges = [part.edges().sort_by_distance(p)[0] for p in [
        (95, 34, 0.6),
    ]]
    fillet(fillet_10_edges, radius=FILLET_10_R)


solid = part.part
